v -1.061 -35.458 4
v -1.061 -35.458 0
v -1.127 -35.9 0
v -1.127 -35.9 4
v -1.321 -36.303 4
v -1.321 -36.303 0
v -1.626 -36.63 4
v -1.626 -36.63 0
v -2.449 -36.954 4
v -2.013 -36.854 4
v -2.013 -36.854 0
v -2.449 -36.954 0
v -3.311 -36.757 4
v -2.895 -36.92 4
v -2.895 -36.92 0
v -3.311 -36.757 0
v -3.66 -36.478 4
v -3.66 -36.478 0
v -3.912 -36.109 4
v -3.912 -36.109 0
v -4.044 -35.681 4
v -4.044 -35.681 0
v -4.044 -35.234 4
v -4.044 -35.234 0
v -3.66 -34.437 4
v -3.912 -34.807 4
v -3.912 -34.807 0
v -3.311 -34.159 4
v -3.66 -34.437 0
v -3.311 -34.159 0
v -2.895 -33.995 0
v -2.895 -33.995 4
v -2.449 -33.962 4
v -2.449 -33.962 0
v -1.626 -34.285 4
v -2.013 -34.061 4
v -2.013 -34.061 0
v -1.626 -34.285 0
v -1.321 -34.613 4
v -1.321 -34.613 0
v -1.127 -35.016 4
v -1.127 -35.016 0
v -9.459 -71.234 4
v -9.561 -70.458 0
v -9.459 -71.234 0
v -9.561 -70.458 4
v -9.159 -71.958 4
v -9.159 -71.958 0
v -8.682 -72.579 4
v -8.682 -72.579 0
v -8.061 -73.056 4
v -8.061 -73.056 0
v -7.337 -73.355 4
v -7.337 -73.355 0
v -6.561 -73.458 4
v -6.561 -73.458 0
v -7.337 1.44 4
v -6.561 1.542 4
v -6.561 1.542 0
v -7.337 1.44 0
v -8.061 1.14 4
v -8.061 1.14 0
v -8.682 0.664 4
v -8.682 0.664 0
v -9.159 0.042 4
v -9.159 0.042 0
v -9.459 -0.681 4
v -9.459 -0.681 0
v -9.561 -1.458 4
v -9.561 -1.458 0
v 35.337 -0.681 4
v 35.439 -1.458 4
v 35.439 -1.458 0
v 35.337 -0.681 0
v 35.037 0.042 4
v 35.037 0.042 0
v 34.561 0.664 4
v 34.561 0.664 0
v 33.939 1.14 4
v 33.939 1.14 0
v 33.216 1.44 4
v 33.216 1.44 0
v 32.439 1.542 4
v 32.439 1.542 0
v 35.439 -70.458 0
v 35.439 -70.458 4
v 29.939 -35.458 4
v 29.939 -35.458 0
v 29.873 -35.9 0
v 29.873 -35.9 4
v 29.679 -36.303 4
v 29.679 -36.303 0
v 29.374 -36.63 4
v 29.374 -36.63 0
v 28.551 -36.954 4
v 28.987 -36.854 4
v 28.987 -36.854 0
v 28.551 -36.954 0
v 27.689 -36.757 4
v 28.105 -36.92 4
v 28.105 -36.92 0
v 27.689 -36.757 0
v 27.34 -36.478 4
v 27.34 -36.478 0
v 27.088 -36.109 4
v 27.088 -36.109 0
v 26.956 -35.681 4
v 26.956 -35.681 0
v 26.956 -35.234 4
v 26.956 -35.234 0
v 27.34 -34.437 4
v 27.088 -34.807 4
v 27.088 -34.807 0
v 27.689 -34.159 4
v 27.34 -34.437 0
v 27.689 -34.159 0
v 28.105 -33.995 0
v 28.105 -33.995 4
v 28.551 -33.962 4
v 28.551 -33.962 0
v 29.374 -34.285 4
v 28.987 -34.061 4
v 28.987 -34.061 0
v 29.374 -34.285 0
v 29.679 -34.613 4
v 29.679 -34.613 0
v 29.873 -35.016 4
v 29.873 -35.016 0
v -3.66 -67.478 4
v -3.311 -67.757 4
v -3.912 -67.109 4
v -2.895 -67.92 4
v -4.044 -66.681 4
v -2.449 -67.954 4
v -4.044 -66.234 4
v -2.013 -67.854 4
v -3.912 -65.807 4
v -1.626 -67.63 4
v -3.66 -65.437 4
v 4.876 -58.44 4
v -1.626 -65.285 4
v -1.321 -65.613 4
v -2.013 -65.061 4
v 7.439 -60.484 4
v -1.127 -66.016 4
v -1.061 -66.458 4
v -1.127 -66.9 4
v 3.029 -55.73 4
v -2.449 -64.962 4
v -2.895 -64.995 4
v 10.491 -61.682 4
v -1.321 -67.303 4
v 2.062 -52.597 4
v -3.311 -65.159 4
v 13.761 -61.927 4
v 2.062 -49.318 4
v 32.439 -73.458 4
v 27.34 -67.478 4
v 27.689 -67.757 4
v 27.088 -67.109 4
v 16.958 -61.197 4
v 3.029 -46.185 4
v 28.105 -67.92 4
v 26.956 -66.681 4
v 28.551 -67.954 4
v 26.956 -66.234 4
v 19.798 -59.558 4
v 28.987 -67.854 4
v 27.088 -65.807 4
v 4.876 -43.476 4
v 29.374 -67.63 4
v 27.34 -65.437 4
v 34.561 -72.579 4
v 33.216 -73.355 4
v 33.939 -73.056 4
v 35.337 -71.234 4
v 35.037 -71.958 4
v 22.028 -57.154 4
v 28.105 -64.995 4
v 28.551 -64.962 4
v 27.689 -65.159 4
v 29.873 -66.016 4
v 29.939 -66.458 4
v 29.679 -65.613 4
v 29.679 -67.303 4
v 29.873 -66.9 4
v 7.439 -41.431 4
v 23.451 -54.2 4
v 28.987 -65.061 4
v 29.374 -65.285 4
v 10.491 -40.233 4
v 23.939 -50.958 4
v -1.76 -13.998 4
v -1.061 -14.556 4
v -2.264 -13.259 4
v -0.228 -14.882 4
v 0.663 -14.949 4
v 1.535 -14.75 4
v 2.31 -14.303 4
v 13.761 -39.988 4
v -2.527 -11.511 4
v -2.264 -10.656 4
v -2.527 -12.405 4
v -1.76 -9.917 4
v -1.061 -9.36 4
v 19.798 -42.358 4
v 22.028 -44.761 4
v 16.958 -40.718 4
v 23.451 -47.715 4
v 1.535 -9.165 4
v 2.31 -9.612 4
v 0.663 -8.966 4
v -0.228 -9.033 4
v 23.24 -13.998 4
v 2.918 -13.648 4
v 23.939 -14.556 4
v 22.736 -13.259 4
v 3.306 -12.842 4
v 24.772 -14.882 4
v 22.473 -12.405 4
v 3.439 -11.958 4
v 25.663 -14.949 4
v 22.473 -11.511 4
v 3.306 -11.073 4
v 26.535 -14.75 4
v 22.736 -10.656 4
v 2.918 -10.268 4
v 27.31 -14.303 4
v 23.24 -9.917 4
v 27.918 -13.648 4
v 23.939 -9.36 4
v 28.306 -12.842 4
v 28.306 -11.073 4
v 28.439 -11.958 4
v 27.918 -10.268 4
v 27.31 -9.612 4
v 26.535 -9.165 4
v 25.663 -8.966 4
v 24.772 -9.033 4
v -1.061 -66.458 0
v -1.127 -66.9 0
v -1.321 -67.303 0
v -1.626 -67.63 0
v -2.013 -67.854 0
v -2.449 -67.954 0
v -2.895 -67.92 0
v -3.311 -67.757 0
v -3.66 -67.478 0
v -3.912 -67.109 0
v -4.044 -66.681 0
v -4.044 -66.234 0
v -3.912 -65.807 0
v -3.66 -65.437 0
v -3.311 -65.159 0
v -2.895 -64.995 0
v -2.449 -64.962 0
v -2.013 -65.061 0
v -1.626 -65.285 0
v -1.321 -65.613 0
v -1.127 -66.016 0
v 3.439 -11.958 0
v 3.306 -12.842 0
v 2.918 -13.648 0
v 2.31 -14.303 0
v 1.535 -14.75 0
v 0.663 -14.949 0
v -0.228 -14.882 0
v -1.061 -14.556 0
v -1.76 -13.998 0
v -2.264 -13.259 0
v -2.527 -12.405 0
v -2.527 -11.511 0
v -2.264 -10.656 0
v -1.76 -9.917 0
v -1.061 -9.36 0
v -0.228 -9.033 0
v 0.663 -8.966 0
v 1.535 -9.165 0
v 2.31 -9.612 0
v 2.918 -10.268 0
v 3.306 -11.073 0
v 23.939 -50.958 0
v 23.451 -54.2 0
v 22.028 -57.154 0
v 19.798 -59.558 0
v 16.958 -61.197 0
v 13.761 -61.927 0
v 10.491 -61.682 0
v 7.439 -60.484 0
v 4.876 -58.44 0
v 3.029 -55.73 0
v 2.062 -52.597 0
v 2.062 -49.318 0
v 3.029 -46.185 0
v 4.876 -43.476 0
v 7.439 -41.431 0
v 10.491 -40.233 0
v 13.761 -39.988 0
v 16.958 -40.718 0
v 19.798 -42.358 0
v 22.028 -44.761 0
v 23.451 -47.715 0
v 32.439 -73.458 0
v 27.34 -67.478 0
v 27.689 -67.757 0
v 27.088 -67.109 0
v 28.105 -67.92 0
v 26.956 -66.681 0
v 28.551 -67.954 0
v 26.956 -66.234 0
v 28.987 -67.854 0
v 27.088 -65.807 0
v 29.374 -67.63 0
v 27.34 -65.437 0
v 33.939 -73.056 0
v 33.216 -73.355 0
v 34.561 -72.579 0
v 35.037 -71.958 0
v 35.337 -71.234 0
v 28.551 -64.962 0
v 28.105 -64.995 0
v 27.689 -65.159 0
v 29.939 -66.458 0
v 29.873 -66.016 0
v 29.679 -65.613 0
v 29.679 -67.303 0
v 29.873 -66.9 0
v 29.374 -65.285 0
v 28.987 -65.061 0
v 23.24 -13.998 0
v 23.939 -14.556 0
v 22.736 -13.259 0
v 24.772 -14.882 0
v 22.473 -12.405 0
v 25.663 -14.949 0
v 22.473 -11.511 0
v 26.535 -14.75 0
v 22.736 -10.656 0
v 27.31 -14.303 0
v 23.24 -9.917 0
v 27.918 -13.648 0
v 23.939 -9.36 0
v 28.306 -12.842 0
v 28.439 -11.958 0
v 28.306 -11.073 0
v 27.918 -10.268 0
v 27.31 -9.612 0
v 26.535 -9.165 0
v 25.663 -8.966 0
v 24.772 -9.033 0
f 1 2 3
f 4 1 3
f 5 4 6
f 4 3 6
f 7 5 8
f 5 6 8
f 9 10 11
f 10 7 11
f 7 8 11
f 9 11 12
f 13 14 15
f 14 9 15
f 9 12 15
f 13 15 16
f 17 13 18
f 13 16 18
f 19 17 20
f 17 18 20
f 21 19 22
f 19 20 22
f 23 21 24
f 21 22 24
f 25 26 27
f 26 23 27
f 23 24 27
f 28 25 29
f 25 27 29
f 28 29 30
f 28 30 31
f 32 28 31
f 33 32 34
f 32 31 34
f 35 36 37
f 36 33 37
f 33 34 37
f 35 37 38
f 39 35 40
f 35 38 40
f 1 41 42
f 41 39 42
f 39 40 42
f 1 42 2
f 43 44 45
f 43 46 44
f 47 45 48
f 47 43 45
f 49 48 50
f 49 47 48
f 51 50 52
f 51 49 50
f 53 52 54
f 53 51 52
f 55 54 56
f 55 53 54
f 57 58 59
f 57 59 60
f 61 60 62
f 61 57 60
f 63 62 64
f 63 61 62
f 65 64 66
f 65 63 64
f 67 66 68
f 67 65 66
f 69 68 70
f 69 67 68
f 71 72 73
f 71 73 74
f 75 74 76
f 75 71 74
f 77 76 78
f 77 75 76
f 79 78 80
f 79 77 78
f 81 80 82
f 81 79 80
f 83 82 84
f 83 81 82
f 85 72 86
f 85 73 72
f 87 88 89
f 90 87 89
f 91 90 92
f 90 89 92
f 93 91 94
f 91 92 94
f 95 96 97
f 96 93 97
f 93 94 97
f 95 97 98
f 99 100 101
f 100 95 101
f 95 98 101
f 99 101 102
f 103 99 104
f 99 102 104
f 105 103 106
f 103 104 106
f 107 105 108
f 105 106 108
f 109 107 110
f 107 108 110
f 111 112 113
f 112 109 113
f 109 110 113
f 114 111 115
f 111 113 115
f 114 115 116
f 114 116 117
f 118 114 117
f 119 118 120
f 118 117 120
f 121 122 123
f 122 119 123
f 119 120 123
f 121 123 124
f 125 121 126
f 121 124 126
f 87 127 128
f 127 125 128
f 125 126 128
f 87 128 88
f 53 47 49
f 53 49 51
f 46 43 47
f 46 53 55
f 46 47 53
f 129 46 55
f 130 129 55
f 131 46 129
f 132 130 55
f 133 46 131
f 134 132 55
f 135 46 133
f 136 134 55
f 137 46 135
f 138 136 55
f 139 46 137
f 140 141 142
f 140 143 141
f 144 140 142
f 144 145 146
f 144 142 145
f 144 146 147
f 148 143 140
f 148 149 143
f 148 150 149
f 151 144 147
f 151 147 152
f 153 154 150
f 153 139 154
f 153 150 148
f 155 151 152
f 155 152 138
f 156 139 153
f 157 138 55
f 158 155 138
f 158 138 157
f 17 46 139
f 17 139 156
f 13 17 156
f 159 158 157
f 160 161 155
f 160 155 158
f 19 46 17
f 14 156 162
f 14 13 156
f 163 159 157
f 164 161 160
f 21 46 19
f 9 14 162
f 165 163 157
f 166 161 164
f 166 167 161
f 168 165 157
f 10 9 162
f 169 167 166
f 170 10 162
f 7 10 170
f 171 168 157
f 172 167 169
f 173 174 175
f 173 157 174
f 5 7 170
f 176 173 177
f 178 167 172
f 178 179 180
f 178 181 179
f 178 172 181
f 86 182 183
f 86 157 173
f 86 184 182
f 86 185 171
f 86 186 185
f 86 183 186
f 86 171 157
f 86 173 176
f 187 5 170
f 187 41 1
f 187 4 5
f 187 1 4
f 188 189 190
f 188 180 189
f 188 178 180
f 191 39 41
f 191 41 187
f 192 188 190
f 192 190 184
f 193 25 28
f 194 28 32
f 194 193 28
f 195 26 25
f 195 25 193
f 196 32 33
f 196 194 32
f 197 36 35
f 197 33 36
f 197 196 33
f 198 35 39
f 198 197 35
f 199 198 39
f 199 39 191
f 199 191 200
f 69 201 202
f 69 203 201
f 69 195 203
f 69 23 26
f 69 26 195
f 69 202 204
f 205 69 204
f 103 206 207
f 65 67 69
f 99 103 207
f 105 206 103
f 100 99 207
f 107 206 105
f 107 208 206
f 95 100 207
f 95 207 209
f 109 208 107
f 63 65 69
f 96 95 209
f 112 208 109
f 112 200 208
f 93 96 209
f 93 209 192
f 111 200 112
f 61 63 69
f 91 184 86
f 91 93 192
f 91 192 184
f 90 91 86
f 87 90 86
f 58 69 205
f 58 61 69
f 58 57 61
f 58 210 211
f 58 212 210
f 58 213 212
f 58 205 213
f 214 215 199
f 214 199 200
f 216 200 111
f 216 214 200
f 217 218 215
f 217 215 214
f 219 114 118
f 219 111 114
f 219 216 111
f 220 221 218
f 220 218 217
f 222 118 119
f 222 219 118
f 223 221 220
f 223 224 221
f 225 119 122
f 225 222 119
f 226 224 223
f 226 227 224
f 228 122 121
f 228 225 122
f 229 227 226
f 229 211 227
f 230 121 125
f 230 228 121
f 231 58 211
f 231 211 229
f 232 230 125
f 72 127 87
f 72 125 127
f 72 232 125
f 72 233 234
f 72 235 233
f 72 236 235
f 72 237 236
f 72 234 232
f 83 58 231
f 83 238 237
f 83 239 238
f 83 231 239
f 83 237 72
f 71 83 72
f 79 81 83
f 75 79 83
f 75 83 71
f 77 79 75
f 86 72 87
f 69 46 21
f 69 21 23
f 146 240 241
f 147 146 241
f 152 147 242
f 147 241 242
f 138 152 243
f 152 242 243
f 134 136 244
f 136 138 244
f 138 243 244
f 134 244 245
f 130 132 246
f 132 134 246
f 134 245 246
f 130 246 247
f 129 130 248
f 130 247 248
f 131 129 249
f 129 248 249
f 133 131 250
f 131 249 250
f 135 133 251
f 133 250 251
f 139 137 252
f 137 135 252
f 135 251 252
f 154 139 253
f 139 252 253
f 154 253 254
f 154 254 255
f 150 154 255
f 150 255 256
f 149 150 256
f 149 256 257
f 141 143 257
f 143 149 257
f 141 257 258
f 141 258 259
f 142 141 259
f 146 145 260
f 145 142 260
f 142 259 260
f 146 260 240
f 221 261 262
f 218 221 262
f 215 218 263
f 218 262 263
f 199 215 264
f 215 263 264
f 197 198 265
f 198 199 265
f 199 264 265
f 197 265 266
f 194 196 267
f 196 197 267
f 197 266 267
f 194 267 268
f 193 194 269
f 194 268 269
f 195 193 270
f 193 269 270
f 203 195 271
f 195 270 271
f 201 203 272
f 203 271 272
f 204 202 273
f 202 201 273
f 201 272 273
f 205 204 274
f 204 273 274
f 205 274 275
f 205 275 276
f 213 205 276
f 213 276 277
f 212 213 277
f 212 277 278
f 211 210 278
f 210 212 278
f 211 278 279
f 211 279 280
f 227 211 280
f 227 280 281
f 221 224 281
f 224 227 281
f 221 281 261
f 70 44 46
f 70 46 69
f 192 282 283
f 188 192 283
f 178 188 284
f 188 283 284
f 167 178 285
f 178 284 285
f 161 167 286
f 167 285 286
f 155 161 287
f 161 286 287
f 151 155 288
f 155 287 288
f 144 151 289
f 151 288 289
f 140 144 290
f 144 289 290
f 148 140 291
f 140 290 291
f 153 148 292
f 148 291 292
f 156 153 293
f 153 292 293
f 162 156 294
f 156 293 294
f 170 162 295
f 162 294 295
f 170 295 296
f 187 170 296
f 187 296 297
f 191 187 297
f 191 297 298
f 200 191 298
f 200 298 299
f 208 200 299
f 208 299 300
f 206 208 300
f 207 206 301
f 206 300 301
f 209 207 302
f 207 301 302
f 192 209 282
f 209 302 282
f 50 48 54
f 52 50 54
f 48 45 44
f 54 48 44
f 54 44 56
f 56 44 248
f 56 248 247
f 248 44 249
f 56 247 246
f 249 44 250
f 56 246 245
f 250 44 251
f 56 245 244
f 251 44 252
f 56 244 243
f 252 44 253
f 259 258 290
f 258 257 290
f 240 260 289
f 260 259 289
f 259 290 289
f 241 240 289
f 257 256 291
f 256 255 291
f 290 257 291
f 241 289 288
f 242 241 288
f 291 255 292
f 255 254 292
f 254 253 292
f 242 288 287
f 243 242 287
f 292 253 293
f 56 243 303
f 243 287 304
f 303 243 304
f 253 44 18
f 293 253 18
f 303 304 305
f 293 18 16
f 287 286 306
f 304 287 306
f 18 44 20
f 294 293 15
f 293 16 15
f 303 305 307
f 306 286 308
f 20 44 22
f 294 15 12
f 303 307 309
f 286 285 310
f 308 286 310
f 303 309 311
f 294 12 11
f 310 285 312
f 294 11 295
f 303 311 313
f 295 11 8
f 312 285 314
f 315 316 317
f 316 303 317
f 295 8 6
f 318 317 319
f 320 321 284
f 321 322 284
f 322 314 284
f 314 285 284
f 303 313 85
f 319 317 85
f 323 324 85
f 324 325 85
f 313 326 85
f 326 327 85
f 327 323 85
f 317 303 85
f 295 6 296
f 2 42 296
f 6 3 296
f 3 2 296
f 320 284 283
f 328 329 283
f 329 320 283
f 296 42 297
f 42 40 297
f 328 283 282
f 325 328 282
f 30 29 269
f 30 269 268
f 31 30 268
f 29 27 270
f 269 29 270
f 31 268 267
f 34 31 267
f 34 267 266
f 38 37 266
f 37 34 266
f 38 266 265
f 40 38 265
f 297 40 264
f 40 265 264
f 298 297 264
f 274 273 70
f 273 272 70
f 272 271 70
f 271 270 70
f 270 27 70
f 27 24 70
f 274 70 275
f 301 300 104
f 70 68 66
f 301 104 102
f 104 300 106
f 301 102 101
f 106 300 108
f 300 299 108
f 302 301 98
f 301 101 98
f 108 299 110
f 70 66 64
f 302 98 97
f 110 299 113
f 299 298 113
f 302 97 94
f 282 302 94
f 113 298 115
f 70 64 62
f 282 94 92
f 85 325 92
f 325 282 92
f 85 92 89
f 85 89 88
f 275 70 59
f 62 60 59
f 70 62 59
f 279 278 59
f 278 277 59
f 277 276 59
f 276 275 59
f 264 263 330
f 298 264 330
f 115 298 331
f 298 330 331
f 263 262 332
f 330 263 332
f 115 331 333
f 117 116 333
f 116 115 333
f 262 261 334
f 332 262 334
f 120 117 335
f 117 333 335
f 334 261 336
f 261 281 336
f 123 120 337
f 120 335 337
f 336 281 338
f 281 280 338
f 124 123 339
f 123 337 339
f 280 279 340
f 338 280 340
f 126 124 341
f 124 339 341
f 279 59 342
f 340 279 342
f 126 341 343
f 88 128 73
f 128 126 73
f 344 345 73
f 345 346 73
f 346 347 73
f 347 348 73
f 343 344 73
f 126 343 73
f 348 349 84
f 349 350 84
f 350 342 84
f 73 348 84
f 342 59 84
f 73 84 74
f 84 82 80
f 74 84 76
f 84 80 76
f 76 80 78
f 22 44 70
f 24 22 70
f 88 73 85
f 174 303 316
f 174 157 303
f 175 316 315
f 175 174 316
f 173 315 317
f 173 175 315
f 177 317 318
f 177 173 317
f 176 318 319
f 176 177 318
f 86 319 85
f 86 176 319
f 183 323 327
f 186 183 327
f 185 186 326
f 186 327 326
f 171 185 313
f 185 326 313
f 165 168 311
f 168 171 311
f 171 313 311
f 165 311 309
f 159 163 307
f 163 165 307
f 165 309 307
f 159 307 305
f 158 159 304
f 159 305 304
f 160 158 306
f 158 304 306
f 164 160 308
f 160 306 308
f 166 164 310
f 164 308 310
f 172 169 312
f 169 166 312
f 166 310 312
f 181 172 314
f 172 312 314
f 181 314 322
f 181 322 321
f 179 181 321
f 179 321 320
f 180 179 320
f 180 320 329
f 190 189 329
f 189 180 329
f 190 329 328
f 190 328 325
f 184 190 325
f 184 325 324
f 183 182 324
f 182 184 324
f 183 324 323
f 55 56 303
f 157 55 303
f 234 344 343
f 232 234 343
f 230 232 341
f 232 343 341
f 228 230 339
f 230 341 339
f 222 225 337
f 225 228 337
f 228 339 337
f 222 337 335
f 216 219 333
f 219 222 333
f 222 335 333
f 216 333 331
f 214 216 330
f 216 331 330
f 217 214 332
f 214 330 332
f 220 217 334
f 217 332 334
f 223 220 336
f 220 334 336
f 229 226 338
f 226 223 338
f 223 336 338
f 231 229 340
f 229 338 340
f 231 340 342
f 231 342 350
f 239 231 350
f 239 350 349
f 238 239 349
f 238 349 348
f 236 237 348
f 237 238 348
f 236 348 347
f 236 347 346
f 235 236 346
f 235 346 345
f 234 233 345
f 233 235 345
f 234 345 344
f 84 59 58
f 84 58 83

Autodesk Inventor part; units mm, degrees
ref_plane "YZ Plane" through (0, 0, 0) normal (1, 0, 0) x (0, 1, 0)
ref_plane "XZ Plane" through (0, 0, 0) normal (0, 1, 0) x (-1, 0, 0)
ref_plane "XY Plane" through (0, 0, 0) normal (0, 0, 1) x (1, 0, 0)
sketch "Szkic1" plane through (0, 0, 0) normal (0, 0, 1) x (1, 0, 0)
  line L0 (-9.5608, 1.5423) -> (35.4392, 1.5423)
  line L1 (35.4392, 1.5423) -> (35.4392, -73.4577)
  line L2 (26.8018, -148.3336) -> (-18.1982, -148.3336)
  line L3 (-9.5608, -73.4577) -> (-9.5608, 1.5423)
  line L4 (33.9392, -71.9577) -> (-8.0608, -71.9577)
  line L5 (-8.0608, -71.9577) -> (-8.0608, -29.9577)
  line L6 (-8.0608, -29.9577) -> (33.9392, -29.9577)
  line L7 (33.9392, -29.9577) -> (33.9392, -71.9577)
  line L8 (-9.5608, -73.4577) -> (35.4392, -73.4577)
  circle A0 centre (12.9392, -50.9577) radius 11
  circle A1 centre (-2.5608, -35.4577) radius 1.5
  circle A2 centre (28.4392, -35.4577) radius 1.5
  circle A3 centre (-2.5608, -66.4577) radius 1.5
  circle A4 centre (28.4392, -66.4577) radius 1.5
  circle A5 centre (0.4392, -11.9577) radius 3
  circle A6 centre (25.4392, -11.9577) radius 3
  point P0 (0, 0)
  dimension "d0" = 45
  dimension "d1" = 75
  dimension "d2" = 42
  dimension "d3" = 42
  dimension "d4" = 5.5
  dimension "d5" = 5.5
  dimension "d6" = 5.5
  dimension "d7" = 5.5
  dimension "d8" = 5.5
  dimension "d9" = 5.5
  dimension "d10" = 5.5
  dimension "d11" = 5.5
  dimension "d12" = 21
  dimension "d13" = 21
  dimension "d24" = 45
  dimension "d25" = 1.5
  dimension "d26" = 1.5
  dimension "d27" = 13.5
  dimension "d28" = 13.5
  dimension "d29" = 22
  dimension "d30" = 3
  dimension "d31" = 3
  dimension "d32" = 3
  dimension "d33" = 3
  dimension "d43" = 10
  dimension "d44" = 10
  dimension "d45" = 6
  dimension "d46" = 6
extrude "Wyciągnięcie proste2" add sketch "Szkic1" along normal blind 4 contours L0 L1 L8 L3 | L4 L5 L6 L7
fillet "Zaokrąglenie1" radius 3 4 edges at (35.4392, -73.4577, 2) (-9.5608, -73.4577, 2) (35.4392, 1.5423, 2) (-9.5608, 1.5423, 2)
equation "\"d5\" = d4"
equation "\"d6\" = d4"
equation "\"d7\" = d4"
equation "\"d8\" = d4"
equation "\"d9\" = d4"
equation "\"d10\" = d4"
equation "\"d11\" = d4"
equation "\"d12\" = 0.5 * d3"
equation "\"d13\" = d12"
equation "\"d25\" = -0.5 * d2 + 0.5 * d24"
equation "\"d28\" = d27"
properties part number "LC_ALU_4mm_Z_Axis_Stepper_Mount"
